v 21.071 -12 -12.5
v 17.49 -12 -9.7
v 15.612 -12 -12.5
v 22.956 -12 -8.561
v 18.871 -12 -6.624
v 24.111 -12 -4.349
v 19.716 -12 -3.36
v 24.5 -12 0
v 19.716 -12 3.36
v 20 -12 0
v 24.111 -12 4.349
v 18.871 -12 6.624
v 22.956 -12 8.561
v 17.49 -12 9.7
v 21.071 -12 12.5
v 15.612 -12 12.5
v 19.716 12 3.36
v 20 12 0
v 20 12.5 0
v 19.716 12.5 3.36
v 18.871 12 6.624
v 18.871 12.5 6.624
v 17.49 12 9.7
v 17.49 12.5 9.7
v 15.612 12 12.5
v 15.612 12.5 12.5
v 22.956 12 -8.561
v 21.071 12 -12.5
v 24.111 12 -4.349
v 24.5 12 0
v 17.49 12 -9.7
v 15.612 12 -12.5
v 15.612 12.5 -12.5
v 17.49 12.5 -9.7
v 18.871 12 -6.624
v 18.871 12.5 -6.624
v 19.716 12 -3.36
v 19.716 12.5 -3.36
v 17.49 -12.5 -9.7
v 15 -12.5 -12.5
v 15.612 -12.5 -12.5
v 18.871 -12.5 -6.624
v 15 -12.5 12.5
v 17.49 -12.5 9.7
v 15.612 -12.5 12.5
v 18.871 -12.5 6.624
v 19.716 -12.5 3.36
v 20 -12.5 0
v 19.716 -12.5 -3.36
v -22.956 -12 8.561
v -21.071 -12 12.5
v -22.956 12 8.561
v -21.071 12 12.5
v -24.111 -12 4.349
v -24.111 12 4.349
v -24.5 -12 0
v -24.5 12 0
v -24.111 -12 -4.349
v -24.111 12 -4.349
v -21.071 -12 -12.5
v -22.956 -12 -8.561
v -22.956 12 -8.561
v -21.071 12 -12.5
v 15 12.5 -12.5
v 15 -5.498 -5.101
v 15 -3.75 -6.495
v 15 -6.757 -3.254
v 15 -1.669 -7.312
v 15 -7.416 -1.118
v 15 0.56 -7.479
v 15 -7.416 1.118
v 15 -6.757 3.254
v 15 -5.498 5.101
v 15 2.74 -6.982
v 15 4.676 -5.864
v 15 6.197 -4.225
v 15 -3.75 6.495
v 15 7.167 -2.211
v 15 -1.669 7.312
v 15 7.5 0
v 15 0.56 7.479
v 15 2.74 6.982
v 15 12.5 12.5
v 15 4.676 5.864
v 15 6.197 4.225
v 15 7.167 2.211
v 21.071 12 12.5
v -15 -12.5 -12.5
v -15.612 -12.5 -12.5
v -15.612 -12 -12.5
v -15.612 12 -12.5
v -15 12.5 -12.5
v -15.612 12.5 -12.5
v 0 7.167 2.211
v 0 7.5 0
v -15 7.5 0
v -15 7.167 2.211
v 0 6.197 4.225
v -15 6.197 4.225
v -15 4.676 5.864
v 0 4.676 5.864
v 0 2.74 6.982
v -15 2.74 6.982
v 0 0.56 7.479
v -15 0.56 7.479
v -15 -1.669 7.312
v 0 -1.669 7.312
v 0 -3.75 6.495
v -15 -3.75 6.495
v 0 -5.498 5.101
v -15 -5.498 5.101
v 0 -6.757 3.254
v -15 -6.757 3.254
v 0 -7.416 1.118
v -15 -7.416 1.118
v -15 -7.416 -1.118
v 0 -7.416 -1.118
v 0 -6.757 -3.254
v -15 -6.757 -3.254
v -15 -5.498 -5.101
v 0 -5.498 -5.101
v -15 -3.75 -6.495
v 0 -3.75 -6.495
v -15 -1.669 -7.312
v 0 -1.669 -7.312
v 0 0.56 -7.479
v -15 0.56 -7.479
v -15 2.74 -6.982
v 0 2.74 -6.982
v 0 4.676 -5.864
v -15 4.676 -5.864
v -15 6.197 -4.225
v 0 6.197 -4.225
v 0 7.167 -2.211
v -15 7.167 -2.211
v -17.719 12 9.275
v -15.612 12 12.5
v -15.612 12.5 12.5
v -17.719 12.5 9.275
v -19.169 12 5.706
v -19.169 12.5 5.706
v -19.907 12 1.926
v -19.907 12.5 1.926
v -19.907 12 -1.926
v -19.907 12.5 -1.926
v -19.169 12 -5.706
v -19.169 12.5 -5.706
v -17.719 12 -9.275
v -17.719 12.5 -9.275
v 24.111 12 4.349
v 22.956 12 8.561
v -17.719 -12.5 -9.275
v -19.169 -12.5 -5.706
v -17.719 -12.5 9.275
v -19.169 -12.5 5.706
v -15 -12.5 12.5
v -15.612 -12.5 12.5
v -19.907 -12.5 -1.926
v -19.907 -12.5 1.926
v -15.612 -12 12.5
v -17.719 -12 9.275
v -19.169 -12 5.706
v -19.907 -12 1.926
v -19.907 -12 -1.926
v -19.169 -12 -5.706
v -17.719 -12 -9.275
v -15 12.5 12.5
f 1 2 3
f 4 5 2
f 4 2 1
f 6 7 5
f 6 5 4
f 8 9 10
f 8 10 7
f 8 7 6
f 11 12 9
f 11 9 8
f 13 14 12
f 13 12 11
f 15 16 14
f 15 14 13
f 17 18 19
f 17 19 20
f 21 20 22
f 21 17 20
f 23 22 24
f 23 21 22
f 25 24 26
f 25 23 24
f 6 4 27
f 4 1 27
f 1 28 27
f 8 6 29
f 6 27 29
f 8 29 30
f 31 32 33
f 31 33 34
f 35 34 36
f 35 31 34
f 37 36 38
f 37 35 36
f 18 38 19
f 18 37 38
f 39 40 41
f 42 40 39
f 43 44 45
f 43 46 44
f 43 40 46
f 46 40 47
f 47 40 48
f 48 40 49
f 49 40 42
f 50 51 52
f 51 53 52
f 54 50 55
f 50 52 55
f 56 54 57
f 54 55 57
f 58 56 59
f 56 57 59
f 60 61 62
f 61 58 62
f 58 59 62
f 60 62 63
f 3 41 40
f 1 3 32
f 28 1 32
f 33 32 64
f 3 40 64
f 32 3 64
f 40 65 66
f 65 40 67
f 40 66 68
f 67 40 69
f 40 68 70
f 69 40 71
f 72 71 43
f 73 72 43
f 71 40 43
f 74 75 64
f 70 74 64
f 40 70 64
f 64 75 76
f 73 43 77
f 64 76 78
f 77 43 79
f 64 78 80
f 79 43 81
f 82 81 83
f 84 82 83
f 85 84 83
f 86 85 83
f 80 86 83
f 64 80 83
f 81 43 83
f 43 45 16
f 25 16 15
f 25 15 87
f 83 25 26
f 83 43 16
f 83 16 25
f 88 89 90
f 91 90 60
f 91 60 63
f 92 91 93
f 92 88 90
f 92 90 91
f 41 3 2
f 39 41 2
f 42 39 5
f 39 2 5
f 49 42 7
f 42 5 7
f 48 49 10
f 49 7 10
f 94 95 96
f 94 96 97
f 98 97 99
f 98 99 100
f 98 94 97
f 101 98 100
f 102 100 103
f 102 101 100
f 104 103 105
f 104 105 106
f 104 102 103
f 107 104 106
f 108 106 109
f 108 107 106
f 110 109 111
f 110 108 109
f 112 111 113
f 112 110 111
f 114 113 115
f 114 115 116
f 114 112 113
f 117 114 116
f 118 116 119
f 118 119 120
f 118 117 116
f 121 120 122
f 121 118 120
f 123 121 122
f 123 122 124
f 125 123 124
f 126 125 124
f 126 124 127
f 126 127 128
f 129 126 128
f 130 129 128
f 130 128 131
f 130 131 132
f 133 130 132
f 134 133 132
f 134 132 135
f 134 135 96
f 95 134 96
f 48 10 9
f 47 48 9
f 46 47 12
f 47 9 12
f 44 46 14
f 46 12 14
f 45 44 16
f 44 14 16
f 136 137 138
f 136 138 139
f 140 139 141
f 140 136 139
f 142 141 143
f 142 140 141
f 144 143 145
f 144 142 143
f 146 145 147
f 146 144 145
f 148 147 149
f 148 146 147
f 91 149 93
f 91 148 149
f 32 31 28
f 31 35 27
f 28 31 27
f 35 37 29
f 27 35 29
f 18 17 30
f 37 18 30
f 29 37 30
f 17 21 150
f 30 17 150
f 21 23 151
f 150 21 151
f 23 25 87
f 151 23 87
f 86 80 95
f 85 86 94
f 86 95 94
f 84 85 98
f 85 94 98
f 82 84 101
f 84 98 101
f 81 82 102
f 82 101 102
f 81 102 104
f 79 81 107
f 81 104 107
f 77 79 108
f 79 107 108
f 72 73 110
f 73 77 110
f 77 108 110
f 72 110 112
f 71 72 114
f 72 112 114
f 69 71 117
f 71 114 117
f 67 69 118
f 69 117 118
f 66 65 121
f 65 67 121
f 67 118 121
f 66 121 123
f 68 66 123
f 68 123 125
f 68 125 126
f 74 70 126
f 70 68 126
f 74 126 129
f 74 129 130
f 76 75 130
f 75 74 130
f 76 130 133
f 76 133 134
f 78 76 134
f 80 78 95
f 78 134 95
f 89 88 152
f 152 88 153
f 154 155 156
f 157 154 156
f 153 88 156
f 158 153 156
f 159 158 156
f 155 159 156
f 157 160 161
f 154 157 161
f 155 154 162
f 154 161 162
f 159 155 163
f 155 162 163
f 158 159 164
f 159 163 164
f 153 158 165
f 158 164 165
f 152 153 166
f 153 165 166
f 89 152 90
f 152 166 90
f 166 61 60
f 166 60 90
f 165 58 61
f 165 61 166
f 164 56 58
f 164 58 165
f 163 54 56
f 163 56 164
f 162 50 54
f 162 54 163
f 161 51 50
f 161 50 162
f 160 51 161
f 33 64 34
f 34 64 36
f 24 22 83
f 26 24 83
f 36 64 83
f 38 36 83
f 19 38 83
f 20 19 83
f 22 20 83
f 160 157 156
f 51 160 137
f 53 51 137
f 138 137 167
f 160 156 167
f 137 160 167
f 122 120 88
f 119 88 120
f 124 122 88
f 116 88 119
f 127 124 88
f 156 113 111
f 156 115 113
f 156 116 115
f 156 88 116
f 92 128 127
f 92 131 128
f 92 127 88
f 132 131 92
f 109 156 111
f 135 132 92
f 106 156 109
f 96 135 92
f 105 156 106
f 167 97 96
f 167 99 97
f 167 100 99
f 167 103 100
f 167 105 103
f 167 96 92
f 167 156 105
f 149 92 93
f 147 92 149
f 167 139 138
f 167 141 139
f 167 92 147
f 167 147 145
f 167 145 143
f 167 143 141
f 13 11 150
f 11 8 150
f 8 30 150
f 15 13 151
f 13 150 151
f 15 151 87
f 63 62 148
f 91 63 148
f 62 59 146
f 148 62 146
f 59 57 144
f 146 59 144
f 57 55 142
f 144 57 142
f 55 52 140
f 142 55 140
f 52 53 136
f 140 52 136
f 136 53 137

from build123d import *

# Parameters (mm, degrees)
F1_START      = -15
F0_W          = 25
F0_H          = 25
F0_R          = 7.5
F1_DEPTH      = 10
F2_START      = 15
F2_DEPTH      = 10
F3_DEPTH      = 16
F3_DEPTH_BACK = 16
F5_START      = -25
F4_R          = 24.5
F5_DEPTH      = 50
F7_START      = -12
F6_R          = 37.8818681869
F6_R_2        = 20
F7_DEPTH      = 13
F8_START      = 12
F8_DEPTH      = 13


with BuildPart() as f1:
    # F0 (on Right) → F1 (new body)
    with BuildSketch(Plane.YZ.offset(F1_START)):
        Rectangle(F0_W, F0_H)
        Circle(F0_R, mode=Mode.SUBTRACT)
        Circle(F0_R)
    extrude(amount=-F1_DEPTH)



with BuildPart() as f2:
    # F0 (on Right) → F2 (new body)
    with BuildSketch(Plane.YZ.offset(F2_START)):
        Rectangle(F0_W, F0_H)
        Circle(F0_R, mode=Mode.SUBTRACT)
        Circle(F0_R)
    extrude(amount=F2_DEPTH)


with BuildPart() as f1_1:
    add(f1.part)

    add(f2.part)  # F3 merges F2
    # F0 (on Right) → F3 (join, two sides)
    with BuildSketch(Plane.YZ) as f3_sk:
        Circle(F0_R)
    extrude(amount=F3_DEPTH)
    extrude(f3_sk.sketch, amount=-F3_DEPTH_BACK)

    # F4 (on Front) → F5 (intersect)
    with BuildSketch(Plane.XZ.offset(F5_START)):
        Circle(F4_R)
    extrude(amount=F5_DEPTH, mode=Mode.INTERSECT)

    # F6 (on Front) → F7 (cut)
    with BuildSketch(Plane.XZ.offset(F7_START)):
        Circle(F6_R)
        Circle(F6_R_2, mode=Mode.SUBTRACT)
    extrude(amount=-F7_DEPTH, mode=Mode.SUBTRACT)

    # F6 (on Front) → F8 (cut)
    with BuildSketch(Plane.XZ.offset(F8_START)):
        Circle(F6_R)
        Circle(F6_R_2, mode=Mode.SUBTRACT)
    extrude(amount=F8_DEPTH, mode=Mode.SUBTRACT)


solid = f1_1.part
